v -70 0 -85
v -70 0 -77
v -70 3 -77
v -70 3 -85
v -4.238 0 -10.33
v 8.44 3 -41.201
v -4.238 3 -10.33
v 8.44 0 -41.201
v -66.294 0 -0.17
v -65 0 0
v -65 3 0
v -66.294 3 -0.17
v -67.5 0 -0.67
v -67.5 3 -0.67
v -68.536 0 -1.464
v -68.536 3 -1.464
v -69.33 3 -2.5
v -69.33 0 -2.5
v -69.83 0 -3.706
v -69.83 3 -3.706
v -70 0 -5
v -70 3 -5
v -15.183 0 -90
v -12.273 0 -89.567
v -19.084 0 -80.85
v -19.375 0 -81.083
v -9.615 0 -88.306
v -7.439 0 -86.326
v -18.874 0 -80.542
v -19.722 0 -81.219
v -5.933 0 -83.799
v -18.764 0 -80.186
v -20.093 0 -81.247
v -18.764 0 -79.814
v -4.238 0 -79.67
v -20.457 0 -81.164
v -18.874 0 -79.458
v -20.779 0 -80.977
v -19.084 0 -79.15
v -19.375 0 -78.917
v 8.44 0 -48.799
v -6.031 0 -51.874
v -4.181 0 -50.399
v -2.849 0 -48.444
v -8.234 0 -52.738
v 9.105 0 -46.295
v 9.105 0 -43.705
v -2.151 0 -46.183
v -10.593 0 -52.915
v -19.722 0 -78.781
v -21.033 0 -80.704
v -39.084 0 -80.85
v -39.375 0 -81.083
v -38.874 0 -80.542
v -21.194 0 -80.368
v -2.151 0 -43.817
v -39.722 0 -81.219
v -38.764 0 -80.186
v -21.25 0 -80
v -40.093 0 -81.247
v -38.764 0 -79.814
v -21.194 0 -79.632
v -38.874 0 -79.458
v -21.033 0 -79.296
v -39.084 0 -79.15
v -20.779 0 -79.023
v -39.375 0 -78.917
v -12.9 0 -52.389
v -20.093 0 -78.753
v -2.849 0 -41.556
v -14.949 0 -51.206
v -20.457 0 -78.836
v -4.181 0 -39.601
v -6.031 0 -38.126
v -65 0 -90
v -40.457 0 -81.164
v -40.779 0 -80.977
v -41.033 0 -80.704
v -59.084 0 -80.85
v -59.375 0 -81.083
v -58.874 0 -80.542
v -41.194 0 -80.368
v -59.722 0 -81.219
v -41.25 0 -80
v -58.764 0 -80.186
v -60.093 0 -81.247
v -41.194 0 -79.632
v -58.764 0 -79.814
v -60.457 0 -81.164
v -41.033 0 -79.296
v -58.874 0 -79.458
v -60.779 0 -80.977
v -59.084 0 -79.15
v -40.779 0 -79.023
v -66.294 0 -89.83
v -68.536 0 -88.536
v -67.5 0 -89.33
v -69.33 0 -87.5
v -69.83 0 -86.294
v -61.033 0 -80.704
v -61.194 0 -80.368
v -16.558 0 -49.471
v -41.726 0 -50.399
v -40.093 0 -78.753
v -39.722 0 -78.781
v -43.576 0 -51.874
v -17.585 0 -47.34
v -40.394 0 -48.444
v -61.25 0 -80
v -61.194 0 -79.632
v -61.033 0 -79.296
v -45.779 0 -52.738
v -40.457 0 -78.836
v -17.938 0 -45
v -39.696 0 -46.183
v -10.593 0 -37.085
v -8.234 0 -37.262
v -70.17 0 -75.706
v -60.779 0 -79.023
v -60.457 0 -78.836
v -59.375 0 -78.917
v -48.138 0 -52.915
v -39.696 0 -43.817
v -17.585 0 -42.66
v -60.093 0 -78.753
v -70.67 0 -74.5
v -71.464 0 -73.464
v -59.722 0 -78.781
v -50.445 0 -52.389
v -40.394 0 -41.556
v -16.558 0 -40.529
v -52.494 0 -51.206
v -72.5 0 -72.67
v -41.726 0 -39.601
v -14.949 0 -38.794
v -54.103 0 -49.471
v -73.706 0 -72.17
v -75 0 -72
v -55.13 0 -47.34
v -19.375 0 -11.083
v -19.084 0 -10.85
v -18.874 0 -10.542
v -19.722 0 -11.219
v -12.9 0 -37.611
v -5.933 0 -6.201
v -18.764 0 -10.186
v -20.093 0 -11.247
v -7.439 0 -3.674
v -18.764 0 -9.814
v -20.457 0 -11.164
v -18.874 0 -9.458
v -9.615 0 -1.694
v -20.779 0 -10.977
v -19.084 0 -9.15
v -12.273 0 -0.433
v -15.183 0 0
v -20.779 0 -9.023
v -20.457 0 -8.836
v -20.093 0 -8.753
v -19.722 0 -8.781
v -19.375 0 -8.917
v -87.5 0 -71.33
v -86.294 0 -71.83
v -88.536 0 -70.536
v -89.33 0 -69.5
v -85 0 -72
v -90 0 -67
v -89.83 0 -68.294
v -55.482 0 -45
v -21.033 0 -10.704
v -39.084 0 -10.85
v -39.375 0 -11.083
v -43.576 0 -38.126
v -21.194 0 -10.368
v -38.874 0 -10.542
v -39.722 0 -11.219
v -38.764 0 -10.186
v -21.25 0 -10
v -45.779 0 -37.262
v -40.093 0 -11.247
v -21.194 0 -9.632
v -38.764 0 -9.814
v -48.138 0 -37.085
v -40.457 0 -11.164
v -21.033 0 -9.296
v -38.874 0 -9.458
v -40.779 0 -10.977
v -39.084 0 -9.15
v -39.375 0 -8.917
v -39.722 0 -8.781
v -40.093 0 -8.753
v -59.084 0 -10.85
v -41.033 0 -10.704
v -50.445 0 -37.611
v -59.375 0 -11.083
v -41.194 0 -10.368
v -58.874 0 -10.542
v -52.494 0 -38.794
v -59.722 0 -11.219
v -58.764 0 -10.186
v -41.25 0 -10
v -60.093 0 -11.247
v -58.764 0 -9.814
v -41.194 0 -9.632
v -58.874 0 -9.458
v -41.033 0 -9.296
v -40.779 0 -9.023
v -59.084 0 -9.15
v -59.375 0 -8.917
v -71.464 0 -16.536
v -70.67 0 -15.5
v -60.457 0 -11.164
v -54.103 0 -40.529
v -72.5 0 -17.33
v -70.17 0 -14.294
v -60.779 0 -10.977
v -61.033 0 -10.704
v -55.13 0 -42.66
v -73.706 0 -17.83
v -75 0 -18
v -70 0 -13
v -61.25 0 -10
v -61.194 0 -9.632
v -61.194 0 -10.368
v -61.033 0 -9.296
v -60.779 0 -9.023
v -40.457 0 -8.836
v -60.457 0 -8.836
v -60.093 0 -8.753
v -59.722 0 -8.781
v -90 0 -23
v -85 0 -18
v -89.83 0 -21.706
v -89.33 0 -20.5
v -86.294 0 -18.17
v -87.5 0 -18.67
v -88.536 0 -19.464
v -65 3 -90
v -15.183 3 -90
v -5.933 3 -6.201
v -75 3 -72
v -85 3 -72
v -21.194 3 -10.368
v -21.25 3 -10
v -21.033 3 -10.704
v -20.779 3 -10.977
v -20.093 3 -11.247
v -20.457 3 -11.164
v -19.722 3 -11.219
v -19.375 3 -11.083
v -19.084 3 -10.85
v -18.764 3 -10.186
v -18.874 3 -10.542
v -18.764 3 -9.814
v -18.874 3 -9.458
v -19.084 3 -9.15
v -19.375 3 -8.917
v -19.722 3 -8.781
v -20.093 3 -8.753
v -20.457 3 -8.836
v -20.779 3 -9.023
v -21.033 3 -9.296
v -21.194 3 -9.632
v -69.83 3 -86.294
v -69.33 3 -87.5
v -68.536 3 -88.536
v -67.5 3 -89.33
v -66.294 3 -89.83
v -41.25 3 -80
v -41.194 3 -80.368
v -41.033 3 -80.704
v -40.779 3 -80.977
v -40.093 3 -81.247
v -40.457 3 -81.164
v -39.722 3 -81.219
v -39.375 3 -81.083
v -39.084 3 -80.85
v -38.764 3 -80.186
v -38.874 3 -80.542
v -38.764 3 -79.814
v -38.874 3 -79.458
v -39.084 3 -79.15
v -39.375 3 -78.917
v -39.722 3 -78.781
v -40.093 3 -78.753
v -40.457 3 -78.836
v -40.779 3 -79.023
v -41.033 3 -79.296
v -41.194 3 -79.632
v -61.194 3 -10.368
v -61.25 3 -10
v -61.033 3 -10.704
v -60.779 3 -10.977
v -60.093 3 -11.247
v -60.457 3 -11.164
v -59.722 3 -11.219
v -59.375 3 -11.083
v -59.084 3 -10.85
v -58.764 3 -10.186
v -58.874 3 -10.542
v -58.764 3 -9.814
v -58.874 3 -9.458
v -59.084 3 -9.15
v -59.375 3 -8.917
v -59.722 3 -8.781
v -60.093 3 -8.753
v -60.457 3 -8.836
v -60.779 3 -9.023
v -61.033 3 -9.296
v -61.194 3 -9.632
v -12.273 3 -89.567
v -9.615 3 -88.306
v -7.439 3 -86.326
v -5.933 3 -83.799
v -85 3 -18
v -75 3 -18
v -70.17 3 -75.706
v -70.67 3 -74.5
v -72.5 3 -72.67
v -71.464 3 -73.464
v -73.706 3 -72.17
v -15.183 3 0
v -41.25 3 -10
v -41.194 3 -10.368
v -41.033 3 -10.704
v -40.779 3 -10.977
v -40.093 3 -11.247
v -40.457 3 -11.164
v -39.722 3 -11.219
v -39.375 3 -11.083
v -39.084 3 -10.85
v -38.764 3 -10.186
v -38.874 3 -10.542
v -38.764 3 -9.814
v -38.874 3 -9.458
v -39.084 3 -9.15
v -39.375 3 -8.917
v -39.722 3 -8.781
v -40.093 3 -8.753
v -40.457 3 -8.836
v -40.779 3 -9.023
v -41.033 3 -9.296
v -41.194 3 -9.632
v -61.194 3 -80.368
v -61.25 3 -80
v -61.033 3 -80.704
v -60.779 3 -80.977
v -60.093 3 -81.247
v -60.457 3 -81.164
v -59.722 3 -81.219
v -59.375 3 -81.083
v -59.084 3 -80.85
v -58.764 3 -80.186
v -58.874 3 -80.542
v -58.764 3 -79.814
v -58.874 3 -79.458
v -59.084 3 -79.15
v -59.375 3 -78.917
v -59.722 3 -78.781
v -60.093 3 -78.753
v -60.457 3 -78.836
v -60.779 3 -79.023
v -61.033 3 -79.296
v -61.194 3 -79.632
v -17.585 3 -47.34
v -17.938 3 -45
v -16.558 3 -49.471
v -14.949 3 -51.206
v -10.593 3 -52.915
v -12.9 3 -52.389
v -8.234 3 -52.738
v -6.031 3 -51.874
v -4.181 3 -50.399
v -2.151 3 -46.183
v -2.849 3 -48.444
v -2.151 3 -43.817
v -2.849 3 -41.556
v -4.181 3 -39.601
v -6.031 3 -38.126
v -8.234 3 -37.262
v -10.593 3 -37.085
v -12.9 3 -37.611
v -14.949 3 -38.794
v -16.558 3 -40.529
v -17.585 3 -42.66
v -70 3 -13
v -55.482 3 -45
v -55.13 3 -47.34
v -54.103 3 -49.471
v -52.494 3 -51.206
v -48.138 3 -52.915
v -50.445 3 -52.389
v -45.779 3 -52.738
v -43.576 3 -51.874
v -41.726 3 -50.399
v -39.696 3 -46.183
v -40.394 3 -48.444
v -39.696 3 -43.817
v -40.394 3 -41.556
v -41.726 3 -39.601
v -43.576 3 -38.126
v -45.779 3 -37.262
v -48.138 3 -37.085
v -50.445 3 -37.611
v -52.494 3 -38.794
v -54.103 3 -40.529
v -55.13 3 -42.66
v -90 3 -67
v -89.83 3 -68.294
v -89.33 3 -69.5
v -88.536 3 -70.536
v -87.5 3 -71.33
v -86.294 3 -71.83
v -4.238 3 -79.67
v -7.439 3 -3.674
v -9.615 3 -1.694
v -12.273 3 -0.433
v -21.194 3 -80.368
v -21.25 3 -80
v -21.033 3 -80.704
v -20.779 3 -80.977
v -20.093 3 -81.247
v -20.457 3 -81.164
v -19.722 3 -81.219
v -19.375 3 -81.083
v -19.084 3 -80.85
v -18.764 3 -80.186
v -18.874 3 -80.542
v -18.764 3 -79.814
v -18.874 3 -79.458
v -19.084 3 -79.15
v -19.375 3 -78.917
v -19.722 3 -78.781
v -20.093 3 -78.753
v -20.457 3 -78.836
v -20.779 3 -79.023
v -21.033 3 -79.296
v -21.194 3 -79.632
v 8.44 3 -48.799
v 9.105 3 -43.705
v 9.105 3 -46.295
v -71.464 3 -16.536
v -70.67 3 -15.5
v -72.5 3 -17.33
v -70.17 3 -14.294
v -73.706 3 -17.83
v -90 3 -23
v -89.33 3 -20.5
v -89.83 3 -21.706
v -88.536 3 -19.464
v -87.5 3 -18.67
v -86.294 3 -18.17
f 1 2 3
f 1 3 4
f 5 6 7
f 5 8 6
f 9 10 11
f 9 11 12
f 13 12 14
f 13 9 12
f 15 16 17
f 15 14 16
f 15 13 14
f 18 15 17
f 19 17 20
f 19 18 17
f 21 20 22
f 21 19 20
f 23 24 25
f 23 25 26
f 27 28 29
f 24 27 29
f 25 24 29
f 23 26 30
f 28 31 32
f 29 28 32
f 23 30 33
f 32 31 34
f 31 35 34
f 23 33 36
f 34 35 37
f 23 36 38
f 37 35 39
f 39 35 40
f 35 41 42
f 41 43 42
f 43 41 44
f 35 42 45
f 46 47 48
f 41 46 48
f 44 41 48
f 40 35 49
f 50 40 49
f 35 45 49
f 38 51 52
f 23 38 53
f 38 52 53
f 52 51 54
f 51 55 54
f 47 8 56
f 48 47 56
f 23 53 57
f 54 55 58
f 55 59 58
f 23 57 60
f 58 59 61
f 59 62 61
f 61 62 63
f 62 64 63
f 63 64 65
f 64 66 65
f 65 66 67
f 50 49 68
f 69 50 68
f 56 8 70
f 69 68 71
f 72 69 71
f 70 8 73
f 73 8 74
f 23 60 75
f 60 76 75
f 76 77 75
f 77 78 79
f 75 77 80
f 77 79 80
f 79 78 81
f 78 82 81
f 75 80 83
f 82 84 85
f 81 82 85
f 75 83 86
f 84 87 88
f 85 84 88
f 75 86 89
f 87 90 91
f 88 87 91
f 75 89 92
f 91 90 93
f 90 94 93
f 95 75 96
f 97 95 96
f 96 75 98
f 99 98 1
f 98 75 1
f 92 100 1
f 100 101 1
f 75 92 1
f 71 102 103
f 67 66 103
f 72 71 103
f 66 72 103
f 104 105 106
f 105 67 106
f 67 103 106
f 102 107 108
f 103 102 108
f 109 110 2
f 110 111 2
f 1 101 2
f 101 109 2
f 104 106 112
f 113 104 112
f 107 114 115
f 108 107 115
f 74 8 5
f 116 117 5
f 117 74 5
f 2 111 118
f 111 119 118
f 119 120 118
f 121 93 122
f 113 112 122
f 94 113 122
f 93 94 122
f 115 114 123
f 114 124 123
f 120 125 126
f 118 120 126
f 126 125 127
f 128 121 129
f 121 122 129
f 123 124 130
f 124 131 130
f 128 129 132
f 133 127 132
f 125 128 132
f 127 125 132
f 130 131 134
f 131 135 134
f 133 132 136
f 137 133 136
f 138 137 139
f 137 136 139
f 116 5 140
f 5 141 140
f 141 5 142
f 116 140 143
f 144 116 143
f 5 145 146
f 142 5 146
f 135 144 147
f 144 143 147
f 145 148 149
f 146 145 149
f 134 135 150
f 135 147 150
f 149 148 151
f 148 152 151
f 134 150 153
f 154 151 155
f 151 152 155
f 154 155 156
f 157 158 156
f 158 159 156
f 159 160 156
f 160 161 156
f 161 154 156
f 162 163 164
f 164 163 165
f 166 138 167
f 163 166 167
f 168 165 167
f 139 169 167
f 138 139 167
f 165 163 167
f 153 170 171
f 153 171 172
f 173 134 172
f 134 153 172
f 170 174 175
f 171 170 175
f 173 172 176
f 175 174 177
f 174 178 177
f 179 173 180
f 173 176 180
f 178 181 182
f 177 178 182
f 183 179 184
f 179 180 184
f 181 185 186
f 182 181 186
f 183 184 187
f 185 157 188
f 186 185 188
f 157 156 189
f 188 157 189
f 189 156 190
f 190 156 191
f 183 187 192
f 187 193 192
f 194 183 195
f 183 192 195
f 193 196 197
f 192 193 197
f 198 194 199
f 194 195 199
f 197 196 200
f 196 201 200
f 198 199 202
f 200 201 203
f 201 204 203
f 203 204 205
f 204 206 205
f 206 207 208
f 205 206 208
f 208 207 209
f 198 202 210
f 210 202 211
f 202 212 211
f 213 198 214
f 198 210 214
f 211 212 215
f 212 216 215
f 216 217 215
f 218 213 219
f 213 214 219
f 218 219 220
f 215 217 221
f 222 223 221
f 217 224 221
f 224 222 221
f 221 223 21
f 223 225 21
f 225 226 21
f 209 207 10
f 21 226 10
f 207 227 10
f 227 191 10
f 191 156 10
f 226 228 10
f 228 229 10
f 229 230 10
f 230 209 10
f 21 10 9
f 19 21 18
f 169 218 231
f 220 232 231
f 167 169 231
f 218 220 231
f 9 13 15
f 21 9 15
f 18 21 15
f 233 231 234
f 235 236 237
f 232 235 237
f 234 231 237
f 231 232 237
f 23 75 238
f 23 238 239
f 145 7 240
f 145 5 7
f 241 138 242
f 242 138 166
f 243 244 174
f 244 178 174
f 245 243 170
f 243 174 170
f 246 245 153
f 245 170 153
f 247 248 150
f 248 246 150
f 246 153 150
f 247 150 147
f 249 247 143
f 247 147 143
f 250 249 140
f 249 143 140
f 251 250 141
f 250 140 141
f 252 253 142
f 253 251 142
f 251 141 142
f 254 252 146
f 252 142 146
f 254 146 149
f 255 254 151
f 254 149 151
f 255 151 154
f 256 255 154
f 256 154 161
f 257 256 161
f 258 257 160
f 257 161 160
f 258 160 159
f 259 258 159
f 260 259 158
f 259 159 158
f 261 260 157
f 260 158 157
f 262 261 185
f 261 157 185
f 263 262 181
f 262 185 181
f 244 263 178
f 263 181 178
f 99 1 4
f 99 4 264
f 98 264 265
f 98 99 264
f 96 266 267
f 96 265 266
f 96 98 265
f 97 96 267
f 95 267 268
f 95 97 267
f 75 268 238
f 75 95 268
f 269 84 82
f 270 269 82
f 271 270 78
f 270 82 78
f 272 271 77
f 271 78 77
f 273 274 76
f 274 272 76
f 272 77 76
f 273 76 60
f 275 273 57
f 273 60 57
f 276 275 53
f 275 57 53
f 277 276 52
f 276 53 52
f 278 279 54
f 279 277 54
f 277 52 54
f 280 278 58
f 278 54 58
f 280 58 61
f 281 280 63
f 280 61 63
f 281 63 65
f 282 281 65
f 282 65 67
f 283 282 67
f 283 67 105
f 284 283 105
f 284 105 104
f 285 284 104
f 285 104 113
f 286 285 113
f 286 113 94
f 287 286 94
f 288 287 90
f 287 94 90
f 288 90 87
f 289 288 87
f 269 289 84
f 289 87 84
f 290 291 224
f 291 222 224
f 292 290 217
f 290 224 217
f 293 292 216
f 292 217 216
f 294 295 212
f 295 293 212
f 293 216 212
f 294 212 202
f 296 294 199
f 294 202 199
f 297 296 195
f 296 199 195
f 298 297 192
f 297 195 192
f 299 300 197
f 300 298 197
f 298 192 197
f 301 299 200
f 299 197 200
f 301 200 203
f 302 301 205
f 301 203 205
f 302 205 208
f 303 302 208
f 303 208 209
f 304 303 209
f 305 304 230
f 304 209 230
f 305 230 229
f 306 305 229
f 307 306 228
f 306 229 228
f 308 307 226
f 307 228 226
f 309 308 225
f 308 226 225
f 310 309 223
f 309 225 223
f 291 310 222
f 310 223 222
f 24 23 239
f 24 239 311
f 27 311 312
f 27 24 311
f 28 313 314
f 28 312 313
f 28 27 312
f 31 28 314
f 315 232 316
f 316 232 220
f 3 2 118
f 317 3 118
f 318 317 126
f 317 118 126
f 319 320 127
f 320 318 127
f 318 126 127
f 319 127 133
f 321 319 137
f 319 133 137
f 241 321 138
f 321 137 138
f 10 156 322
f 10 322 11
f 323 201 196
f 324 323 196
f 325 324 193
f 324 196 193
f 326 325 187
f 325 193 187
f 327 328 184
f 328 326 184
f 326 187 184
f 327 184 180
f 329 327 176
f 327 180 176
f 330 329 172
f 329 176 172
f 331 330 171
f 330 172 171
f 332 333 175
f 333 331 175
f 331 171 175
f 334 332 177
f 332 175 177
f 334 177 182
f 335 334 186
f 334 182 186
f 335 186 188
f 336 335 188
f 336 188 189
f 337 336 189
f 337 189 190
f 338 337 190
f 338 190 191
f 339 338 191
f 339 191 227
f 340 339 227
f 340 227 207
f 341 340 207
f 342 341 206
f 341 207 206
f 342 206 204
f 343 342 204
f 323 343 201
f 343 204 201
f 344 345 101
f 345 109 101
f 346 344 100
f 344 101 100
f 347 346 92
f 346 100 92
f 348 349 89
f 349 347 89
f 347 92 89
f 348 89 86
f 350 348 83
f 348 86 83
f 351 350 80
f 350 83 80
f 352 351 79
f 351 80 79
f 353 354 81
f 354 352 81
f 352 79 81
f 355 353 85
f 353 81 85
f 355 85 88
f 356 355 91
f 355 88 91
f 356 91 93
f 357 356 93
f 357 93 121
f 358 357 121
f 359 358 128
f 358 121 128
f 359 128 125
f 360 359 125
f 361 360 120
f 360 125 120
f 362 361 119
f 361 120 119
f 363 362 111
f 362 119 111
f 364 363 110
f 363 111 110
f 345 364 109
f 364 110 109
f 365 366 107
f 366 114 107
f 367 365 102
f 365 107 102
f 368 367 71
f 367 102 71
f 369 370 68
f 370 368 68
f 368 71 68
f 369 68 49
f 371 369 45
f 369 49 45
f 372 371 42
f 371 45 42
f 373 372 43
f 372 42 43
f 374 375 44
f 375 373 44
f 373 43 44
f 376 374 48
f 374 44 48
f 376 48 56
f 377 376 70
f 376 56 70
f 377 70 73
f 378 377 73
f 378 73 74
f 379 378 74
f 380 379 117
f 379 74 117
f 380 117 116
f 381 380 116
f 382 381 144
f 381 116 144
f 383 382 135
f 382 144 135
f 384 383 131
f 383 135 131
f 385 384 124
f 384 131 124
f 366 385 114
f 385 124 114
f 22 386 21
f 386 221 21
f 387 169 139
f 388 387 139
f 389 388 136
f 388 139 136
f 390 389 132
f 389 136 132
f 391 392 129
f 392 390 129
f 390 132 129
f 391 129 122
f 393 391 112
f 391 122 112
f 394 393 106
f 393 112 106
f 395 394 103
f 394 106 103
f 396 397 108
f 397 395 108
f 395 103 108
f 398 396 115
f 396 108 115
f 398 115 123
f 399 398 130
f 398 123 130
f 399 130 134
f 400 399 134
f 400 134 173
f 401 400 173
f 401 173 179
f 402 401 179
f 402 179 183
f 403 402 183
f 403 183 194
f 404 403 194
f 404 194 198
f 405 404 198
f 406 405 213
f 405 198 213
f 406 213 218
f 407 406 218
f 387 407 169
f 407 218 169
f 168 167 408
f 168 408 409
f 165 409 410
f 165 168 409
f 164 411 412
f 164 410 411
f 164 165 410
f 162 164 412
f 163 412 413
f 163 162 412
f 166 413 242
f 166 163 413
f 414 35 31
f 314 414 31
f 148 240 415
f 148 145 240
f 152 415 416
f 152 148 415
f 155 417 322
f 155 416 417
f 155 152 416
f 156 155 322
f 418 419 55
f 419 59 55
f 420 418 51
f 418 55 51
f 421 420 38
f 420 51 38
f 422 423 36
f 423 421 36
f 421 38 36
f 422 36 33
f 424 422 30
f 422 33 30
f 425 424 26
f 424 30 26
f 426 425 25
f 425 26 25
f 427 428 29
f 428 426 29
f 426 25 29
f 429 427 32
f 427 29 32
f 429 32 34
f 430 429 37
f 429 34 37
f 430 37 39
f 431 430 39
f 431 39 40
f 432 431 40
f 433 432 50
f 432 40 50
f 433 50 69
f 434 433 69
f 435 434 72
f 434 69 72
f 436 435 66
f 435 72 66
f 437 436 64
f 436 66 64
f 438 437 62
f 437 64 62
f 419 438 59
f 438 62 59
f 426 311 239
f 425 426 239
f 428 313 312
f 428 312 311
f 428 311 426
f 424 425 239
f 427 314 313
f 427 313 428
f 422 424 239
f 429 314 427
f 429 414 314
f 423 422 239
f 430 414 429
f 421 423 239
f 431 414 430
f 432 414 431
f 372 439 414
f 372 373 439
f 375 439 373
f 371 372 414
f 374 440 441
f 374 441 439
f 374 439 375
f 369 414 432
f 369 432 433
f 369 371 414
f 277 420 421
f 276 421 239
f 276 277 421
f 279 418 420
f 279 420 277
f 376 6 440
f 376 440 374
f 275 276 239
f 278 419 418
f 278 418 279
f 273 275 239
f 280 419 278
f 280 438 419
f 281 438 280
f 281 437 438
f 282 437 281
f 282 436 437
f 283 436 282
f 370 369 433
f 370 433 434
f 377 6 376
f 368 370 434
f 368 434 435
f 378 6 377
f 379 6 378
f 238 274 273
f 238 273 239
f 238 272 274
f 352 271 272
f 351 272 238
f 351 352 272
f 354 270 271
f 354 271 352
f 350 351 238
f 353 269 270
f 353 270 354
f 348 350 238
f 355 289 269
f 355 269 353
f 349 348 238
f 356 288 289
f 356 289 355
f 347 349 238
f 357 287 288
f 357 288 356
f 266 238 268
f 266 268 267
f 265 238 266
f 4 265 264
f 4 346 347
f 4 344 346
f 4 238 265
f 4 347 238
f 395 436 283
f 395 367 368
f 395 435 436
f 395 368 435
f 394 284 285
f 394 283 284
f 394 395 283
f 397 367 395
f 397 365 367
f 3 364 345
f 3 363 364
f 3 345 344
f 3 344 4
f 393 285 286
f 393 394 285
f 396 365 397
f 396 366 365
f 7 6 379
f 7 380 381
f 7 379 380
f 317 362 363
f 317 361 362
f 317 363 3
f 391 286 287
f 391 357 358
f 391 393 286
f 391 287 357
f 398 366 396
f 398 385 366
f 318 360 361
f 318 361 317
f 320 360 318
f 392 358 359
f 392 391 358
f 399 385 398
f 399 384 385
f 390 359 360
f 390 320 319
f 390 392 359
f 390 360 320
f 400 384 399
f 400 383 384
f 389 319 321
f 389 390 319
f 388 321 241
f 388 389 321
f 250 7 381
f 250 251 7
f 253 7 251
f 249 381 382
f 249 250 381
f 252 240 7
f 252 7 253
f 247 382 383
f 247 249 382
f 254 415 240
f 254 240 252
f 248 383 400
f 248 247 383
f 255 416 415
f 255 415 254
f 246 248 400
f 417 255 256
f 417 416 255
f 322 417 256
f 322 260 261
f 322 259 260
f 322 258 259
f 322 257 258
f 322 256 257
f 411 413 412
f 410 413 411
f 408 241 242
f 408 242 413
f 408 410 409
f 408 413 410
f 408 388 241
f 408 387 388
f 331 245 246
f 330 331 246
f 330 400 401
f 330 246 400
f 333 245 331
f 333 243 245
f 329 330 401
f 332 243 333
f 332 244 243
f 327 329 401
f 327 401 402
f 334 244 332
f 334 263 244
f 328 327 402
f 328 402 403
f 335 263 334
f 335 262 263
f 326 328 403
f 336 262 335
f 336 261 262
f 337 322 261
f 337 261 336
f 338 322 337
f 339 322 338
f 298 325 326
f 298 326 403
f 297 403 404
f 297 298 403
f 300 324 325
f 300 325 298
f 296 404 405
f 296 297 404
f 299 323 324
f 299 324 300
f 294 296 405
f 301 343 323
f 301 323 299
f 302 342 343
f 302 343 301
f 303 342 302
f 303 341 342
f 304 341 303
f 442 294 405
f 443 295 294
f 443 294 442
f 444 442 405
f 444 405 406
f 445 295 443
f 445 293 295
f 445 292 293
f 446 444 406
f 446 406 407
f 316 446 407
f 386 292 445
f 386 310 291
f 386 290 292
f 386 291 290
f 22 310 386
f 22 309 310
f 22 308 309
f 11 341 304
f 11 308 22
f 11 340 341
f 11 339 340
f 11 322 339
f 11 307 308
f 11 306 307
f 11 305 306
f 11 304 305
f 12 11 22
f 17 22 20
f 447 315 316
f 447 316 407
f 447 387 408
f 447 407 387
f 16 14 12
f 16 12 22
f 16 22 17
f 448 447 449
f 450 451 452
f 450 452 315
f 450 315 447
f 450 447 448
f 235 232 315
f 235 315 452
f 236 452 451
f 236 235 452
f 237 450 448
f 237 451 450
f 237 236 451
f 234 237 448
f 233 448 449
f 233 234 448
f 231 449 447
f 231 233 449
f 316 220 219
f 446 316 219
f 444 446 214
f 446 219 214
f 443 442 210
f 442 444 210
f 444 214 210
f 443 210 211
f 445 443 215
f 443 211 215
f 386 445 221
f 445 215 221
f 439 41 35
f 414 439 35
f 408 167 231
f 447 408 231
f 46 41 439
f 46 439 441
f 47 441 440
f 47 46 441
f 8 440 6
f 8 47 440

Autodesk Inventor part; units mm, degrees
ref_plane "YZ Plane" through (0, 0, 0) normal (1, 0, 0) x (0, 1, 0)
ref_plane "XZ Plane" through (0, 0, 0) normal (0, 1, 0) x (-1, 0, 0)
ref_plane "XY Plane" through (0, 0, 0) normal (0, 0, 1) x (1, 0, 0)
sketch "Sketch1" plane through (0, 0, 0) normal (0, 1, 0) x (-1, 0, 0)
  line L0 (15.1833, 0) -> (65, 0)
  line L1 (90, 0) -> (90, -18) construction
  line L2 (90, -90) -> (70, -90) construction
  line L3 (0, -90) -> (0, 0) construction
  line L4 (85, -18) -> (75, -18)
  line L5 (70, -18) -> (70, -72) construction
  line L6 (75, -72) -> (85, -72)
  line L7 (90, -67) -> (90, -18)
  circle A0 centre (80, -10) radius 10 construction
  circle A1 centre (80, -80) radius 10 construction
  circle A2 centre (80, -10) radius 1.25
  circle A3 centre (80, -80) radius 1.25
  circle A4 centre (60, -10) radius 1.25
  circle A5 centre (60, -80) radius 1.25
  circle A6 centre (40, -10) radius 1.25
  circle A7 centre (40, -80) radius 1.25
  circle A8 centre (20, -10) radius 1.25
  circle A9 centre (20, -80) radius 1.25
  circle A10 centre (0, -10) radius 1.25 construction
  circle A11 centre (0, -80) radius 1.25 construction
  line L8 (20, -10) -> (0, -80) construction
  circle A12 centre (10, -45) radius 7.9375
  circle A13 centre (10, -45) radius 20 construction
  line L9 (0, 0) -> (-10, 0) construction
  line L10 (-10, 0) -> (-10, -90) construction
  line L11 (-10, -90) -> (0, -90) construction
  circle A14 centre (1, -9) radius 3.5 construction
  circle A15 centre (1, -81) radius 3.5 construction
  line L12 (4.5, -90) -> (4.5, -81) construction
  line L13 (4.5, 0) -> (4.5, -9) construction
  line L14 (-8.44, -48.7987) -> (4.2376, -79.6704)
  line L15 (-8.44, -41.2013) -> (4.2376, -10.3296)
  line L16 (4.2376, -10.3296) -> (5.9329, -6.2013)
  line L17 (4.2376, -79.6704) -> (5.9329, -83.7987)
  arc A16 (15.1833, 0) -> (5.9329, -6.2013) centre (15.1833, -10) ccw
  arc A17 (5.9329, -83.7987) -> (15.1833, -90) centre (15.1833, -80) ccw
  arc A18 (-8.44, -41.2013) -> (-8.44, -48.7987) centre (0.8104, -45) ccw
  line L18 (90, -23) -> (90, -72)
  line L19 (90, -72) -> (90, -90) construction
  line L20 (70, -13) -> (70, -5)
  line L21 (70, -77) -> (70, -85)
  line L22 (65, -90) -> (15.1833, -90)
  arc A19 (70, -5) -> (65, 0) centre (65, -5) ccw
  arc A20 (70, -13) -> (75, -18) centre (75, -13) ccw
  arc A21 (90, -23) -> (85, -18) centre (85, -23) ccw
  arc A22 (85, -72) -> (90, -67) centre (85, -67) ccw
  arc A23 (75, -72) -> (70, -77) centre (75, -77) ccw
  arc A24 (65, -90) -> (70, -85) centre (65, -85) ccw
  line L23 (10, -45) -> (47.545, -45) construction
  circle A25 centre (47.545, -45) radius 7.9375
  point P0 (-10, -45)
  point P1 (8.4795, 0)
  point P2 (8.4795, -90)
  dimension "d0" = 90
  dimension "d1" = 90
  dimension "d2" = 20
  dimension "d3" = 54
  dimension "d4" = 18
  dimension "d5" = 2.5
  dimension "d8" = 70
  dimension "d11" = 20
  dimension "d14" = 15.875
  dimension "d15" = 40
  dimension "d17" = 7
  dimension "d18" = 89
  dimension "d19" = 7
  dimension "d20" = 0
  dimension "d21" = 72
  dimension "d22" = 9
  dimension "d23" = 10
  dimension "d24" = 10
  dimension "d25" = 5
  dimension "d26" = 37.545
  dimension "d27" = 15.875
extrude "Extrusion1" add sketch "Sketch1" along normal blind 3 contours L0 A19 L20 A20 L4 A21 L7 A22 L6 A23 L21 A24 L22 A17 L17 L14 A18 L15 L16 A16
equation "\"d4\" = -0.5 * d3 + 0.5 * d1"
equation "\"d22\" = -0.5 * d21 + 0.5 * d1"
equation "\"d27\" = d14"
properties part number "AntennaPlateUpper"
